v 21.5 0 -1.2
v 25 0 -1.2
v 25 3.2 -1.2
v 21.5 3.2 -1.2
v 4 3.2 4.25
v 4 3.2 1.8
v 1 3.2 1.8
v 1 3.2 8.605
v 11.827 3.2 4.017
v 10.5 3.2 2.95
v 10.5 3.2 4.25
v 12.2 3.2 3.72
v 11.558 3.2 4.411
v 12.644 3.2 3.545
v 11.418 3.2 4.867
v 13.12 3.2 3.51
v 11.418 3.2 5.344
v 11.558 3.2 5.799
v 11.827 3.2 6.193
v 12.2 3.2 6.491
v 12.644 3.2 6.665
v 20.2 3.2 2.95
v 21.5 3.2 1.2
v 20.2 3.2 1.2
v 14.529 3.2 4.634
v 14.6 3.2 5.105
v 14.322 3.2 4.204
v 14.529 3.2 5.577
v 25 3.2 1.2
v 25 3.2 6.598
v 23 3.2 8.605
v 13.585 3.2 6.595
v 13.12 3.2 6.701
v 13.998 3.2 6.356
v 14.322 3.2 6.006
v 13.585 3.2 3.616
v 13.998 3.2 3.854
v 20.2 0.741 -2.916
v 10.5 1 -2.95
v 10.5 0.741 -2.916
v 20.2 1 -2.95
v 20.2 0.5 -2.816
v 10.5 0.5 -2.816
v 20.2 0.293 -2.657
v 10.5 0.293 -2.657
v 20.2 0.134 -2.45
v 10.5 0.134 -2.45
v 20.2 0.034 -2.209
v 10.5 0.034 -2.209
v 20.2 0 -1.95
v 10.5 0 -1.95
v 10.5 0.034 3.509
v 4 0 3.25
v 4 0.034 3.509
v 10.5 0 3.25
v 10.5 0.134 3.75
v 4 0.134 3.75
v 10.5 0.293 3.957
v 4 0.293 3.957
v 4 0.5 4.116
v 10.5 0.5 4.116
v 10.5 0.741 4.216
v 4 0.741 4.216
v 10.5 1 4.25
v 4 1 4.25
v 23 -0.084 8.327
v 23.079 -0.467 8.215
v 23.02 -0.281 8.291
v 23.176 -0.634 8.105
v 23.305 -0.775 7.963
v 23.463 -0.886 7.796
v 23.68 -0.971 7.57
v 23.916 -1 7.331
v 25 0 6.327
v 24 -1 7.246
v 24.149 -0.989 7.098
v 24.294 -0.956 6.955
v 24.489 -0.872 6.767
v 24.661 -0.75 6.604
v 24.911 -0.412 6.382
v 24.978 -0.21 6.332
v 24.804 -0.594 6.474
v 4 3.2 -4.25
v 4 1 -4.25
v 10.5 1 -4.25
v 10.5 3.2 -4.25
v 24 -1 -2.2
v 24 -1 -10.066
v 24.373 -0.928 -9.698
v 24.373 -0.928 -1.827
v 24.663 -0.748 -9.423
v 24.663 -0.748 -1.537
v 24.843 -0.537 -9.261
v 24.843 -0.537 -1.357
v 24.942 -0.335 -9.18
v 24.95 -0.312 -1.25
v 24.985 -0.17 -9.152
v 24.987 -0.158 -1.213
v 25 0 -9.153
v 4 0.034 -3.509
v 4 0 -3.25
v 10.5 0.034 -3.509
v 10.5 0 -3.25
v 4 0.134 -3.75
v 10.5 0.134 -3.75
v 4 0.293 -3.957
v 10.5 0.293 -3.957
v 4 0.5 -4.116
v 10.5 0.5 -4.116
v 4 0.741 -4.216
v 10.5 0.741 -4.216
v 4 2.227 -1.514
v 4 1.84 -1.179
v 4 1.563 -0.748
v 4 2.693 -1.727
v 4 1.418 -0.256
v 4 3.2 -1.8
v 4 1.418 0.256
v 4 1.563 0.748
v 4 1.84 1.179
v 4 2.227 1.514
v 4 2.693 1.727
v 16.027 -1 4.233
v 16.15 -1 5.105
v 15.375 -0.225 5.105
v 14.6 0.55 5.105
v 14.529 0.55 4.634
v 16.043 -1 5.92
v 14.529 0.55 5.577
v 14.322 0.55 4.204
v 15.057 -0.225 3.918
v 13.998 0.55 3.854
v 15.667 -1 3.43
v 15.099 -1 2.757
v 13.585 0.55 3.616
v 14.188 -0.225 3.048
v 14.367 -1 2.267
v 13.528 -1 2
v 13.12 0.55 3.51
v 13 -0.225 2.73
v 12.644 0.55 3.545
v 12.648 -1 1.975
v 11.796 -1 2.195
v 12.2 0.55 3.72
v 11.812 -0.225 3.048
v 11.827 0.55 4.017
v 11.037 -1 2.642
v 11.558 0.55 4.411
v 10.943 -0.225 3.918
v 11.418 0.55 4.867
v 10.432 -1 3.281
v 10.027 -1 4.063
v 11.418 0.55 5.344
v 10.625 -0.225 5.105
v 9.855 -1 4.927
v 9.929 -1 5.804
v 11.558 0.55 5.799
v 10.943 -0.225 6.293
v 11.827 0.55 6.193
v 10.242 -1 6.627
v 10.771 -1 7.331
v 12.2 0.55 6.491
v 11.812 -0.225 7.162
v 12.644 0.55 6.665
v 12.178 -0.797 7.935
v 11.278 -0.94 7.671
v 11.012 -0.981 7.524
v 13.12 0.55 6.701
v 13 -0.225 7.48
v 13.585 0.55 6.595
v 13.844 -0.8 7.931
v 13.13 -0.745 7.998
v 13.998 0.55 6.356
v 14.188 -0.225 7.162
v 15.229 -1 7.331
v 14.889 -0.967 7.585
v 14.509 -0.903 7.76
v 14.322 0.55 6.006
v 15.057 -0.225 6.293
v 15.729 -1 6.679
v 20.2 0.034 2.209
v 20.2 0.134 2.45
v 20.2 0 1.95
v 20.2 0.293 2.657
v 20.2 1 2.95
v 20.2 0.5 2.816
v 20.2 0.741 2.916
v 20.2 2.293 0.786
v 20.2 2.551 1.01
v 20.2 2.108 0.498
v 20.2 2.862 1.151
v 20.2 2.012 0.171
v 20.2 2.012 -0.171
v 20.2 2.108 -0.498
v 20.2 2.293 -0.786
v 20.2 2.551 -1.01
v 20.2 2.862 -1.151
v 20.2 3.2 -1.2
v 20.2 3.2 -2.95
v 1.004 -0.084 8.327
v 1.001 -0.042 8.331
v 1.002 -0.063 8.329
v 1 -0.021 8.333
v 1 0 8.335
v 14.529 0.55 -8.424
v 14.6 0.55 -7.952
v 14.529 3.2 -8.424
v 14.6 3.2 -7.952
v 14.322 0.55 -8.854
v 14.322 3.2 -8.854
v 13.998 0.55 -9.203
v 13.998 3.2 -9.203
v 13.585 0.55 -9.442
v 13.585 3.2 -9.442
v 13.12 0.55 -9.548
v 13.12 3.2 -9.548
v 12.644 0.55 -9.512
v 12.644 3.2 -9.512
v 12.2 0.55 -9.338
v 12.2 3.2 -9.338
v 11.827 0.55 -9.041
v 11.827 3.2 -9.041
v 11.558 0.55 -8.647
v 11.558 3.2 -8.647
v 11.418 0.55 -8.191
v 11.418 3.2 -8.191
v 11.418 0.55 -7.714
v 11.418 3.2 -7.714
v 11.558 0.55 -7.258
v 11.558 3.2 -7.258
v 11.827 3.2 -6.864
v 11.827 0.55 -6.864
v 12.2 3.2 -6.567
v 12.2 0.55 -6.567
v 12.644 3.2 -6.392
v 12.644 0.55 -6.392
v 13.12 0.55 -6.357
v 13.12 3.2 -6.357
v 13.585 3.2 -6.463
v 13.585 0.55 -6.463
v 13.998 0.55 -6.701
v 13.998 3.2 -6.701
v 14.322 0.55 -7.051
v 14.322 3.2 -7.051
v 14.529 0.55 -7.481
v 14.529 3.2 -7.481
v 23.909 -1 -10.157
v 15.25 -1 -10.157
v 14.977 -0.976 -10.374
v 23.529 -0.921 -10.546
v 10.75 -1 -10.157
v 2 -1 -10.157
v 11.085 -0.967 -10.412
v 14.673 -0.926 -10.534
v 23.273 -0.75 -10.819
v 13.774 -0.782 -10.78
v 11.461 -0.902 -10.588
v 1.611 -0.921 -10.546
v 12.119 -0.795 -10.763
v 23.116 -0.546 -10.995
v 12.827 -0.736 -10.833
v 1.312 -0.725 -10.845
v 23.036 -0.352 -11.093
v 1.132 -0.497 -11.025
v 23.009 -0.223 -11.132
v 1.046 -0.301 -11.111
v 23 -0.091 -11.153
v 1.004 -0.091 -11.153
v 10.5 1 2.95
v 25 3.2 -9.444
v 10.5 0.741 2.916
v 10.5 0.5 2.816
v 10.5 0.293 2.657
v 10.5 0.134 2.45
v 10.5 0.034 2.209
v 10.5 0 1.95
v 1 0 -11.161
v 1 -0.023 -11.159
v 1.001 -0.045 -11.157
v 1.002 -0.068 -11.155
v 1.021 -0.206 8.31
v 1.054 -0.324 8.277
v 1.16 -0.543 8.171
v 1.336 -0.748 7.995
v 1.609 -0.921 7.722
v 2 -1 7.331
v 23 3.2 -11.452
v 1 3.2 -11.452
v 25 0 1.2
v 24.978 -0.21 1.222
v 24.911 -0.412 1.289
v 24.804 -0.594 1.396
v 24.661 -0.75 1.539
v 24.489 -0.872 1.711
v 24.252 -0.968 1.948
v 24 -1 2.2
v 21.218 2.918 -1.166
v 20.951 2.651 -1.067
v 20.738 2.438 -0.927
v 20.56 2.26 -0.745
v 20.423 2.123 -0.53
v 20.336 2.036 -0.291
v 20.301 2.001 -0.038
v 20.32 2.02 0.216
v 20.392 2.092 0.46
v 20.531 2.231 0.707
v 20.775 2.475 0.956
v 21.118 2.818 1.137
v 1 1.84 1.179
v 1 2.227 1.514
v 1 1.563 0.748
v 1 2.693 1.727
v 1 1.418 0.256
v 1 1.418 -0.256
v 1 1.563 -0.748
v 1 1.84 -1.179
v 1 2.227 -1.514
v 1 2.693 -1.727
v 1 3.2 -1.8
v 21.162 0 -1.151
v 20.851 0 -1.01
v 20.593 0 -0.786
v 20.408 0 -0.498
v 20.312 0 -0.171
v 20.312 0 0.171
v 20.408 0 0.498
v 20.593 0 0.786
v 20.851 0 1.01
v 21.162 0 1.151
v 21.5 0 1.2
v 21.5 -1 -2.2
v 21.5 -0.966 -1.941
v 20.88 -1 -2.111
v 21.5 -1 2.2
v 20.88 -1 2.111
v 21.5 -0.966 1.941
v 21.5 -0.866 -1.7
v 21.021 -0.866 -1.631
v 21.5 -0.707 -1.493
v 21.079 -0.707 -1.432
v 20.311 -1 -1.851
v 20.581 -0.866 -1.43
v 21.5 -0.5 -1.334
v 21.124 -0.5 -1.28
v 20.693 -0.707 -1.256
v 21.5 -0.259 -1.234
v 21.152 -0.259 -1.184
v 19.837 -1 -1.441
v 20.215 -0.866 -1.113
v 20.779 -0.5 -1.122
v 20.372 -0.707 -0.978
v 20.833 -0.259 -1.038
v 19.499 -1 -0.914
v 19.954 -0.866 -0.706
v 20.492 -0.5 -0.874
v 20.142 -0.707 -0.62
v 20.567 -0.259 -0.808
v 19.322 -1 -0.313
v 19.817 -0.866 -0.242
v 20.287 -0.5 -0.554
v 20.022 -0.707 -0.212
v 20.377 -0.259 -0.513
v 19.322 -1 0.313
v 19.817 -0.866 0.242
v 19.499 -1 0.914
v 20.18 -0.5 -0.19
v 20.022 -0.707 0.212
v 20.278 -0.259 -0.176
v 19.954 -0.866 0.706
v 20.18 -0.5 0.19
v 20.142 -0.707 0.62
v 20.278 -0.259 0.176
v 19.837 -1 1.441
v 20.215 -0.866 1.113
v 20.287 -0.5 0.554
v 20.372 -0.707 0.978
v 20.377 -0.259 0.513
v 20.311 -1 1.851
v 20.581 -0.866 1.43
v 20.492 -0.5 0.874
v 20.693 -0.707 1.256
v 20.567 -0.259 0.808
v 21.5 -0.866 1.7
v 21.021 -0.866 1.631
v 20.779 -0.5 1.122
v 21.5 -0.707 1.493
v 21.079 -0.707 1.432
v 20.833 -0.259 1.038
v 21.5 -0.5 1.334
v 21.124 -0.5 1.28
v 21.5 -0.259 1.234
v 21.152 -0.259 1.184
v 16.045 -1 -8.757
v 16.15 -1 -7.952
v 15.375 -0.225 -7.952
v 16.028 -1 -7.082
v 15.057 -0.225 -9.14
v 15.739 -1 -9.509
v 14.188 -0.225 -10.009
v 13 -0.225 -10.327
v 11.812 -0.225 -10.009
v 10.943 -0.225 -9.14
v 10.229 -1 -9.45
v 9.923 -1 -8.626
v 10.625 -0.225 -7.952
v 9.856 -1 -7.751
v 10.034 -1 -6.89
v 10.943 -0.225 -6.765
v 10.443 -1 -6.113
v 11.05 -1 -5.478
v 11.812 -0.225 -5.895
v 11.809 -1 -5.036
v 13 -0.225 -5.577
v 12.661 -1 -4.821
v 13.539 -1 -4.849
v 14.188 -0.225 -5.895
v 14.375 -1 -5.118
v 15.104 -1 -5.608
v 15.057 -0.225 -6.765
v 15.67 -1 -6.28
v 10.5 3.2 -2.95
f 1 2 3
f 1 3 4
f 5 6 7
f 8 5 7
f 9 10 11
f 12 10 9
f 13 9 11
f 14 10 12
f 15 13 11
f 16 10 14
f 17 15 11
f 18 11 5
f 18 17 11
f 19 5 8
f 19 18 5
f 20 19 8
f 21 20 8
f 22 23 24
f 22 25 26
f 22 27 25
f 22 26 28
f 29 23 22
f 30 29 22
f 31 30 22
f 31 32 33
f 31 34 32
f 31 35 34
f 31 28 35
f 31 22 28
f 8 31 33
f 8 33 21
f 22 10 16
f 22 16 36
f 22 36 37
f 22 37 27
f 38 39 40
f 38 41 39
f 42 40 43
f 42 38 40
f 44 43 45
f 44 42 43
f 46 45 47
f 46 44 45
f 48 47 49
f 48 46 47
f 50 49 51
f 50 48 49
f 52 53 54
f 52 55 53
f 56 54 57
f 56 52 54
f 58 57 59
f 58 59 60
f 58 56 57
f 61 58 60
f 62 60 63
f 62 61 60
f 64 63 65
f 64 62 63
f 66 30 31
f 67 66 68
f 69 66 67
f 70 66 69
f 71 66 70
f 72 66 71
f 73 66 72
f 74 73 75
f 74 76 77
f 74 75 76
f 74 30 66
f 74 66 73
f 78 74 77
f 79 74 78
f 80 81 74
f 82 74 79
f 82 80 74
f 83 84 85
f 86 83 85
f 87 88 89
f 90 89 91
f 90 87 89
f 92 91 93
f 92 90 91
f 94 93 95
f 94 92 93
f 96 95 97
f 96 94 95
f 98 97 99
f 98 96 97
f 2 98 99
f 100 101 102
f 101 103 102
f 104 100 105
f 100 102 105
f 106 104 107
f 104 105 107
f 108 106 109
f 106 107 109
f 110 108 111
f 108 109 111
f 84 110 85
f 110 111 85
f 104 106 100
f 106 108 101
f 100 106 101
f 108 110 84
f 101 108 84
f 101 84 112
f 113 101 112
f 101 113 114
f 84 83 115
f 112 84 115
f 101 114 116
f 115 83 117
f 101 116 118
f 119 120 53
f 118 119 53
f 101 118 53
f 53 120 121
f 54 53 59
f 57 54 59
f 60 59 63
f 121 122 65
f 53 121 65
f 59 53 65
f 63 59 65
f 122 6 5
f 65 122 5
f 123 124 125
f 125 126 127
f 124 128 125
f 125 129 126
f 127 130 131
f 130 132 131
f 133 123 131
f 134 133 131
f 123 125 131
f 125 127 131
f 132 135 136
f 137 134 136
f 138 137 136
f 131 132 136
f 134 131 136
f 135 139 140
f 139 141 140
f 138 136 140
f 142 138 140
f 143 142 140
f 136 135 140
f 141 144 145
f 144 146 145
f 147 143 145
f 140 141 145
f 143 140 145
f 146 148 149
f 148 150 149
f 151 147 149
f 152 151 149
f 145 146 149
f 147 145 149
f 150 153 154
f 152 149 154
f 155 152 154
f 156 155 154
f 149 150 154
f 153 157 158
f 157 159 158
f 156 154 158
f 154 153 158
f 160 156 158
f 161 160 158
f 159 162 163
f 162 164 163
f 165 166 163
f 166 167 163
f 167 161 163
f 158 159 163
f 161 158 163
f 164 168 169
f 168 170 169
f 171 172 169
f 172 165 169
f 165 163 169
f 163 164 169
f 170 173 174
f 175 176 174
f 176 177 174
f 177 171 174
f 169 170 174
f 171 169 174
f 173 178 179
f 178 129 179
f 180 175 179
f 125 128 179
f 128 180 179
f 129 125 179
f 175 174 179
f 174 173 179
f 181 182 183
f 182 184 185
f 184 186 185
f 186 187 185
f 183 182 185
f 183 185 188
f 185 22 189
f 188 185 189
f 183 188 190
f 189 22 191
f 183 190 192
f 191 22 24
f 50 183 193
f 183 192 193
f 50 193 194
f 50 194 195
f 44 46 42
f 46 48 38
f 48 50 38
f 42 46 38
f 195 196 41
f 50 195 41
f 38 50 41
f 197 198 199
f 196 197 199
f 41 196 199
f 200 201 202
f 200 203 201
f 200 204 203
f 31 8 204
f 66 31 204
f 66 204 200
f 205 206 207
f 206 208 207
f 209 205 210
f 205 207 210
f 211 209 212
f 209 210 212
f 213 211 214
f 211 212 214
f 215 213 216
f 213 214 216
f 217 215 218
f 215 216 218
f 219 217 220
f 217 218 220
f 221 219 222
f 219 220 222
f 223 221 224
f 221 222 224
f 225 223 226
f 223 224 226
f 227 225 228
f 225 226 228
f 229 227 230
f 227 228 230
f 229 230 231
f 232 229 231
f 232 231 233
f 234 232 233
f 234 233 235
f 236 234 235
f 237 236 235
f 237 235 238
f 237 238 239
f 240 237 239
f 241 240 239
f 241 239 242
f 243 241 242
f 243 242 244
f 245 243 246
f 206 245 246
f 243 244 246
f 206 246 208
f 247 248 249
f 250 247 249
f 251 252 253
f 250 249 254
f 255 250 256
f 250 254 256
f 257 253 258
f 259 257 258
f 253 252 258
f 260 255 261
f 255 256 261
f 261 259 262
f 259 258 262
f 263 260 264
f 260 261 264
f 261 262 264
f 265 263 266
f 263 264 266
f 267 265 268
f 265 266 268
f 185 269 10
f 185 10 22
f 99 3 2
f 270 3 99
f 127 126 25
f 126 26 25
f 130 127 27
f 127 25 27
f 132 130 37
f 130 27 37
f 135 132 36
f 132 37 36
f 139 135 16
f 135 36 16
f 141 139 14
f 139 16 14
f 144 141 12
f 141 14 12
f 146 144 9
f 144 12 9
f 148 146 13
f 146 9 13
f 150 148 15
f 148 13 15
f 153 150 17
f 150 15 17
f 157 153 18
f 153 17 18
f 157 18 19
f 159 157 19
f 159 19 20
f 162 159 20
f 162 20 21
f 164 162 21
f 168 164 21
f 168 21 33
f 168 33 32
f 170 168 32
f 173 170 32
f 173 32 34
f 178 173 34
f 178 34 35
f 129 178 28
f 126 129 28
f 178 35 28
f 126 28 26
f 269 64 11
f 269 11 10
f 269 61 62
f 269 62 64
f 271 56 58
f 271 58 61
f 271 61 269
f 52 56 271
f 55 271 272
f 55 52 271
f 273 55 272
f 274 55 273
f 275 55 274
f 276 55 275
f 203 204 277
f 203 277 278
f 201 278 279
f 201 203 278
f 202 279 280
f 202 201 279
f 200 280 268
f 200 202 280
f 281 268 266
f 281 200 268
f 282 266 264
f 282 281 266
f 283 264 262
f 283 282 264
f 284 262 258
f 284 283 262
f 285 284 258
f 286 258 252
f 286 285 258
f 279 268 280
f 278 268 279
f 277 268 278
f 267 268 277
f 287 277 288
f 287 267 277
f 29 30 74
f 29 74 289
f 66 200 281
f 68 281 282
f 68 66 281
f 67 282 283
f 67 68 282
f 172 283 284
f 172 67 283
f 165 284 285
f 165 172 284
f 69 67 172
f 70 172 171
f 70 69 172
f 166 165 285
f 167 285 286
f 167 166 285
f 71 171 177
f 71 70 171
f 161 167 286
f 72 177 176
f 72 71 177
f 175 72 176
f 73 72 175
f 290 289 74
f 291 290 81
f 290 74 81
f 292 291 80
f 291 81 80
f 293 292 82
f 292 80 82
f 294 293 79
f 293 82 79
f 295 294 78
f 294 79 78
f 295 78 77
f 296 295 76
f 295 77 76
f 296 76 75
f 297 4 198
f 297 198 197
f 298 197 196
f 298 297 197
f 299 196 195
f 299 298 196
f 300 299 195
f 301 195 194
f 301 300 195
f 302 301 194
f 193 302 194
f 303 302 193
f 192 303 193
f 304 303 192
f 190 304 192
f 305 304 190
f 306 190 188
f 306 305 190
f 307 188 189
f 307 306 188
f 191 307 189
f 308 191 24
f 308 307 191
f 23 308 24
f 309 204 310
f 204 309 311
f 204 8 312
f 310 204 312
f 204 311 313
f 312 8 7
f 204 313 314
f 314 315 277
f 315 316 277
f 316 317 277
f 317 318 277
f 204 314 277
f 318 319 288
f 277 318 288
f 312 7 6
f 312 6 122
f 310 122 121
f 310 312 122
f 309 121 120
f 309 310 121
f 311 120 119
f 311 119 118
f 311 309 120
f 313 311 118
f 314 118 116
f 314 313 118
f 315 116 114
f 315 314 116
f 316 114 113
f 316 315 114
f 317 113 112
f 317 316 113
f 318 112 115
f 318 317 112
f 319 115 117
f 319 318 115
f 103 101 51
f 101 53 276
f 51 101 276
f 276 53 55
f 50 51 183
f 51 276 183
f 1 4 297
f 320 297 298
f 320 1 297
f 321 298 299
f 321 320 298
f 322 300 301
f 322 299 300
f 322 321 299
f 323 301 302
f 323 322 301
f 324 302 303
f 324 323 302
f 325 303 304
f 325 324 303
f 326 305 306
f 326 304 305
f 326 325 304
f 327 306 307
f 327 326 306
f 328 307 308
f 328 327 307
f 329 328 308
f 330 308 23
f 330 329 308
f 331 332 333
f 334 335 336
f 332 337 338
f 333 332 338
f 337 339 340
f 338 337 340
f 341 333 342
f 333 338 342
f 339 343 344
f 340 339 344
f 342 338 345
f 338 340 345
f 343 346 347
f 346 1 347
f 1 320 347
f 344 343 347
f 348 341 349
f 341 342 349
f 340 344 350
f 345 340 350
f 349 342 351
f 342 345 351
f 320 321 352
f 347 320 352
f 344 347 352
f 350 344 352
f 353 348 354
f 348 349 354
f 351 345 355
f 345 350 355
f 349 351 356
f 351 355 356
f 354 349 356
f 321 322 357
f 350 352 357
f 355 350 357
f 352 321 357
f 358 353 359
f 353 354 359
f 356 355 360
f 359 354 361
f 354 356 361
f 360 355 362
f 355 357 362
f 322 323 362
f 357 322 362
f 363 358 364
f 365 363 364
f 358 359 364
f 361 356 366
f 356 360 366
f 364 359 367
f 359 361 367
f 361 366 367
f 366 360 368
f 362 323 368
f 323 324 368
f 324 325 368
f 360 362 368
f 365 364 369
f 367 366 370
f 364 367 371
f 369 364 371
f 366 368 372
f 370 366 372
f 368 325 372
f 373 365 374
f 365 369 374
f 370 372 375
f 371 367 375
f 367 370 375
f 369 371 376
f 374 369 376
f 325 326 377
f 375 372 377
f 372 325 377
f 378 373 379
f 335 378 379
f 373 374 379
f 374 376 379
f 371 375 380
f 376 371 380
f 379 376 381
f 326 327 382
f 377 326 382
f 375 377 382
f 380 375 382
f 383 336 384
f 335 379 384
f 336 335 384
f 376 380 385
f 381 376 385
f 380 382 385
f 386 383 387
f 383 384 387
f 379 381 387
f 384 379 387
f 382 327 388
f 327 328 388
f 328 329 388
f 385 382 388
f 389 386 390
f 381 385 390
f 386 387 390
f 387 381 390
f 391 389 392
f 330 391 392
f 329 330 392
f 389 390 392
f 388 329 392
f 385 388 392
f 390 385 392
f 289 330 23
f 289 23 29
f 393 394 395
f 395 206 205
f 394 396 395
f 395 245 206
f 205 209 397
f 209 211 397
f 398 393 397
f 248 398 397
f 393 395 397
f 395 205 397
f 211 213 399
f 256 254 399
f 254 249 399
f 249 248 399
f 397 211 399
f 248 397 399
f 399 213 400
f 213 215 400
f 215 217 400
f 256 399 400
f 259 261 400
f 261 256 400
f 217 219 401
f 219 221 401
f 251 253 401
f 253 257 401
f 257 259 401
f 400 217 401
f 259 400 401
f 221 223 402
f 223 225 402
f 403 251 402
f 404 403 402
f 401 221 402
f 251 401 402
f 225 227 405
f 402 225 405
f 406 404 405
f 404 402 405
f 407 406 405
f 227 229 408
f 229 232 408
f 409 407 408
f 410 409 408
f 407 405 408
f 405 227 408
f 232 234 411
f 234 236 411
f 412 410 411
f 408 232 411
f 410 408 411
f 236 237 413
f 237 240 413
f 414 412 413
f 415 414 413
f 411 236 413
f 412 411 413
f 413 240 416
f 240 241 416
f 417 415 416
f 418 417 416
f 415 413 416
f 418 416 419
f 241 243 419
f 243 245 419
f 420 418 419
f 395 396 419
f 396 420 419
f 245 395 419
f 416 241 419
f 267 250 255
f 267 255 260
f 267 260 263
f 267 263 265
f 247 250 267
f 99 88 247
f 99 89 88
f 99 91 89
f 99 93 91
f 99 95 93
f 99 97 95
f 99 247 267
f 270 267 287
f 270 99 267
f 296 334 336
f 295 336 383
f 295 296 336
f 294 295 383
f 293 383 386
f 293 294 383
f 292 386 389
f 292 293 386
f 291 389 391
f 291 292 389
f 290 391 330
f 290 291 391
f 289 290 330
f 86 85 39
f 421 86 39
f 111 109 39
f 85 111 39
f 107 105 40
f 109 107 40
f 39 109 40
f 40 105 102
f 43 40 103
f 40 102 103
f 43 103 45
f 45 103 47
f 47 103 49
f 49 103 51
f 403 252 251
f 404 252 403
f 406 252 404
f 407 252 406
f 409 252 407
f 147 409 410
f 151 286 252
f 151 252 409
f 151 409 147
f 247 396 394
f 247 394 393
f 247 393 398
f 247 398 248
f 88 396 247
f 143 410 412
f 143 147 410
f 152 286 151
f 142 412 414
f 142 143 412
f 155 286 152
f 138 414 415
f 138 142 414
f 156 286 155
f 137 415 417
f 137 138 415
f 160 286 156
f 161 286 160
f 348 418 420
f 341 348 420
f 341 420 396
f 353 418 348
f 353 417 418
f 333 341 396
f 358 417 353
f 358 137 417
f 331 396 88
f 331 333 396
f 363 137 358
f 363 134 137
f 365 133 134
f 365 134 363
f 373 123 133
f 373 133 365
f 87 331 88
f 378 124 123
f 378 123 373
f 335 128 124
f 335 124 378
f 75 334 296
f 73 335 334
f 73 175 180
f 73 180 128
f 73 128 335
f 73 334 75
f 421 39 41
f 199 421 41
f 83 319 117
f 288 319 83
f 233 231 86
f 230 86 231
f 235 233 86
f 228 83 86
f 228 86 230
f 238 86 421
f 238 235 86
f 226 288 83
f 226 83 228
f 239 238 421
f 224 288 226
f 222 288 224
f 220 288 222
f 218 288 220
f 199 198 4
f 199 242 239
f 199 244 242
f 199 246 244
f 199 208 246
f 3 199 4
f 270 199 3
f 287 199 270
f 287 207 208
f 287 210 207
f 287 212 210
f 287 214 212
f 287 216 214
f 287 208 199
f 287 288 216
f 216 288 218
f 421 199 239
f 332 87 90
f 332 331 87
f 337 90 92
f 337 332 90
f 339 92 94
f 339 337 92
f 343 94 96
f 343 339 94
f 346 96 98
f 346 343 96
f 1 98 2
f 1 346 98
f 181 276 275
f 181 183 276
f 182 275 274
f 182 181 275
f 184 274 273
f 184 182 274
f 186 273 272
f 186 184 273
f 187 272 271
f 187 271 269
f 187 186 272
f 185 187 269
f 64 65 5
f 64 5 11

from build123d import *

# Parameters (mm, degrees)
BOSS_EXTRUDE1_DEPTH                             = 3.2
SKETCH2_W                                       = 24
SKETCH2_H                                       = 16.5
BOSS_EXTRUDE2_DEPTH                             = 1
BOSS_EXTRUDE3_DEPTH                             = 4.8
BOSS_EXTRUDE4_DEPTH                             = 3
CUT_EXTRUDE1_REACH                              = 28.659
BOSS_EXTRUDE5_DEPTH                             = 24
SKETCH7_R                                       = 1.55
CUT_EXTRUDE2_DEPTH                              = 10
CHAMFER1_SIZE                                   = 2
FILLET1_R                                       = 1
CSK_FOR_M3_FLAT_HEAD_MACHINE_SCREW1_D           = 3.2
CSK_FOR_M3_FLAT_HEAD_MACHINE_SCREW1_CSINK_D     = 6.3
CSK_FOR_M3_FLAT_HEAD_MACHINE_SCREW1_CSINK_ANGLE = 90
FILLET2_R                                       = 1


with BuildPart() as part:
    # Sketch1 → Boss-Extrude1 (new body)
    with BuildSketch(Plane(origin=(0, 0, 0), x_dir=(1, 0, 0), z_dir=(0, 1, 0))):
        Polygon((1, 8.25), (1, 1.8), (4, 1.8), (4, 4.25), (10.5, 4.25), (10.5, 2.95), (20.2, 2.95), (20.2, 1.2), (25, 1.2), (25, 8.25), align=None)
    extrude(amount=BOSS_EXTRUDE1_DEPTH)


with BuildPart() as body_2:
    # Mirror3: mirrored copy
    add(part.part.mirror(Plane.XY))


with BuildPart() as part_1:
    add(part.part)

    add(body_2.part)  # Boss-Extrude2 merges body 2
    # Sketch2 → Boss-Extrude2 (add)
    with BuildSketch(Plane.XZ):
        with Locations((13, 0)):
            Rectangle(SKETCH2_W, SKETCH2_H)
    extrude(amount=BOSS_EXTRUDE2_DEPTH)

    # Sketch4 → Boss-Extrude3 (add)
    with BuildSketch(Plane(origin=(25, 0, 0), x_dir=(0, 0, -1), z_dir=(1, 0, 0))):
        with BuildLine():
            Line((-1.2, 3.2), (-1.2, 0))
            Line((-1.2, 0), (1.2, 0))
            Line((1.2, 0), (1.2, 3.2))
            ThreePointArc((1.2, 3.2), (0, 2), (-1.2, 3.2))
        make_face()
    extrude(amount=-BOSS_EXTRUDE3_DEPTH)

    # Sketch5 → Boss-Extrude4 (add)
    with BuildSketch(Plane.ZY.offset(-1)):
        with BuildLine():
            Line((-1.8, 3.2), (-1.8, 0))
            Line((-1.8, 0), (1.8, 0))
            Line((1.8, 0), (1.8, 3.2))
            ThreePointArc((1.8, 3.2), (0, 1.4), (-1.8, 3.2))
        make_face()
    extrude(amount=-BOSS_EXTRUDE4_DEPTH)

    # Cut-Extrude1: up to this face of the body (flat: up to its plane)
    cut_extrude1_end = Plane(part_1.part.faces().sort_by_distance((13.712117152, 3.2, 5.4174866))[0])
    # Sketch6 → Cut-Extrude1 (cut, up to the picked face)
    with BuildSketch(Plane.XZ.offset(1), mode=Mode.PRIVATE) as cut_extrude1_sk1:
        with BuildLine():
            Line((21.5, 1.2), (25, 1.2))
            Line((25, 1.2), (25, -1.2))
            Line((25, -1.2), (21.5, -1.2))
            ThreePointArc((21.5, -1.2), (20.3, 0), (21.5, 1.2))
        make_face()
    cut_extrude1_tool1 = split(extrude(cut_extrude1_sk1.sketch, amount=-CUT_EXTRUDE1_REACH, mode=Mode.PRIVATE), bisect_by=cut_extrude1_end, keep=Keep.BOTH, mode=Mode.PRIVATE)
    add(cut_extrude1_tool1.solids().sort_by(Axis((22.770687, -1, 0), (0, 1, 0)))[0], mode=Mode.SUBTRACT)

    # Sketch8 → Boss-Extrude5 (add)
    with BuildSketch(Plane(origin=(25, 0, 0), x_dir=(0, 0, -1), z_dir=(1, 0, 0))):
        Polygon((-8.25, 3.2), (-8.605155295, 3.2), (-8.25, -1), align=None)
        Polygon((8.25, 3.2), (8.25, -1), (11.07, -1), (11.452307692, 3.2), align=None)
    extrude(amount=-BOSS_EXTRUDE5_DEPTH)

    # Sketch7 → Cut-Extrude2 (cut)
    with BuildSketch(Plane(origin=(0, 3.2, 0), x_dir=(1, 0, 0), z_dir=(0, 1, 0))):
        with Locations(Location((13, 7.952307692, 0), (0, 0, 270))):
            Circle(SKETCH7_R)
        with Locations(Location((13, -5.105155295, 0), (0, 0, 90))):
            Circle(SKETCH7_R)
    extrude(amount=-CUT_EXTRUDE2_DEPTH, mode=Mode.SUBTRACT)

    # Chamfer1
    chamfer1_edges = [part_1.edges().sort_by_distance(p)[0] for p in [
        (25, 1.1, 8.427577647),
        (25, 1.1, -11.261153846),
    ]]
    chamfer(chamfer1_edges, length=CHAMFER1_SIZE)

    # Fillet1
    fillet1_edges = [part_1.edges().sort_by_distance(p)[0] for p in [
        (25, -1, 3.721431105),
        (20.3, -1, 0),
        (23.25, -1, -1.2),
        (23.25, -1, 1.2),
        (12, -1, -11.07),
        (12, -1, 8.25),
        (25, -1, -5.130865713),
        (1, -1, -1.41),
    ]]
    fillet(fillet1_edges, radius=FILLET1_R)

    # CSK for M3 Flat Head Machine Screw1 (through all)
    with Locations(Plane(origin=(0, -1, 0), x_dir=(-1, 0, 0), z_dir=(0, -1, 0))):
        with Locations((-13, -5.105155295), (-13, 7.952307692)):
            CounterSinkHole(CSK_FOR_M3_FLAT_HEAD_MACHINE_SCREW1_D / 2, CSK_FOR_M3_FLAT_HEAD_MACHINE_SCREW1_CSINK_D / 2, counter_sink_angle=CSK_FOR_M3_FLAT_HEAD_MACHINE_SCREW1_CSINK_ANGLE)

    # Fillet2
    fillet2_edges = [part_1.edges().sort_by_distance(p)[0] for p in [
        (15.35, 0, -2.95),
        (7.25, 0, -4.25),
        (15.35, 0, 2.95),
        (7.25, 0, 4.25),
    ]]
    fillet(fillet2_edges, radius=FILLET2_R)


solid = part_1.part
